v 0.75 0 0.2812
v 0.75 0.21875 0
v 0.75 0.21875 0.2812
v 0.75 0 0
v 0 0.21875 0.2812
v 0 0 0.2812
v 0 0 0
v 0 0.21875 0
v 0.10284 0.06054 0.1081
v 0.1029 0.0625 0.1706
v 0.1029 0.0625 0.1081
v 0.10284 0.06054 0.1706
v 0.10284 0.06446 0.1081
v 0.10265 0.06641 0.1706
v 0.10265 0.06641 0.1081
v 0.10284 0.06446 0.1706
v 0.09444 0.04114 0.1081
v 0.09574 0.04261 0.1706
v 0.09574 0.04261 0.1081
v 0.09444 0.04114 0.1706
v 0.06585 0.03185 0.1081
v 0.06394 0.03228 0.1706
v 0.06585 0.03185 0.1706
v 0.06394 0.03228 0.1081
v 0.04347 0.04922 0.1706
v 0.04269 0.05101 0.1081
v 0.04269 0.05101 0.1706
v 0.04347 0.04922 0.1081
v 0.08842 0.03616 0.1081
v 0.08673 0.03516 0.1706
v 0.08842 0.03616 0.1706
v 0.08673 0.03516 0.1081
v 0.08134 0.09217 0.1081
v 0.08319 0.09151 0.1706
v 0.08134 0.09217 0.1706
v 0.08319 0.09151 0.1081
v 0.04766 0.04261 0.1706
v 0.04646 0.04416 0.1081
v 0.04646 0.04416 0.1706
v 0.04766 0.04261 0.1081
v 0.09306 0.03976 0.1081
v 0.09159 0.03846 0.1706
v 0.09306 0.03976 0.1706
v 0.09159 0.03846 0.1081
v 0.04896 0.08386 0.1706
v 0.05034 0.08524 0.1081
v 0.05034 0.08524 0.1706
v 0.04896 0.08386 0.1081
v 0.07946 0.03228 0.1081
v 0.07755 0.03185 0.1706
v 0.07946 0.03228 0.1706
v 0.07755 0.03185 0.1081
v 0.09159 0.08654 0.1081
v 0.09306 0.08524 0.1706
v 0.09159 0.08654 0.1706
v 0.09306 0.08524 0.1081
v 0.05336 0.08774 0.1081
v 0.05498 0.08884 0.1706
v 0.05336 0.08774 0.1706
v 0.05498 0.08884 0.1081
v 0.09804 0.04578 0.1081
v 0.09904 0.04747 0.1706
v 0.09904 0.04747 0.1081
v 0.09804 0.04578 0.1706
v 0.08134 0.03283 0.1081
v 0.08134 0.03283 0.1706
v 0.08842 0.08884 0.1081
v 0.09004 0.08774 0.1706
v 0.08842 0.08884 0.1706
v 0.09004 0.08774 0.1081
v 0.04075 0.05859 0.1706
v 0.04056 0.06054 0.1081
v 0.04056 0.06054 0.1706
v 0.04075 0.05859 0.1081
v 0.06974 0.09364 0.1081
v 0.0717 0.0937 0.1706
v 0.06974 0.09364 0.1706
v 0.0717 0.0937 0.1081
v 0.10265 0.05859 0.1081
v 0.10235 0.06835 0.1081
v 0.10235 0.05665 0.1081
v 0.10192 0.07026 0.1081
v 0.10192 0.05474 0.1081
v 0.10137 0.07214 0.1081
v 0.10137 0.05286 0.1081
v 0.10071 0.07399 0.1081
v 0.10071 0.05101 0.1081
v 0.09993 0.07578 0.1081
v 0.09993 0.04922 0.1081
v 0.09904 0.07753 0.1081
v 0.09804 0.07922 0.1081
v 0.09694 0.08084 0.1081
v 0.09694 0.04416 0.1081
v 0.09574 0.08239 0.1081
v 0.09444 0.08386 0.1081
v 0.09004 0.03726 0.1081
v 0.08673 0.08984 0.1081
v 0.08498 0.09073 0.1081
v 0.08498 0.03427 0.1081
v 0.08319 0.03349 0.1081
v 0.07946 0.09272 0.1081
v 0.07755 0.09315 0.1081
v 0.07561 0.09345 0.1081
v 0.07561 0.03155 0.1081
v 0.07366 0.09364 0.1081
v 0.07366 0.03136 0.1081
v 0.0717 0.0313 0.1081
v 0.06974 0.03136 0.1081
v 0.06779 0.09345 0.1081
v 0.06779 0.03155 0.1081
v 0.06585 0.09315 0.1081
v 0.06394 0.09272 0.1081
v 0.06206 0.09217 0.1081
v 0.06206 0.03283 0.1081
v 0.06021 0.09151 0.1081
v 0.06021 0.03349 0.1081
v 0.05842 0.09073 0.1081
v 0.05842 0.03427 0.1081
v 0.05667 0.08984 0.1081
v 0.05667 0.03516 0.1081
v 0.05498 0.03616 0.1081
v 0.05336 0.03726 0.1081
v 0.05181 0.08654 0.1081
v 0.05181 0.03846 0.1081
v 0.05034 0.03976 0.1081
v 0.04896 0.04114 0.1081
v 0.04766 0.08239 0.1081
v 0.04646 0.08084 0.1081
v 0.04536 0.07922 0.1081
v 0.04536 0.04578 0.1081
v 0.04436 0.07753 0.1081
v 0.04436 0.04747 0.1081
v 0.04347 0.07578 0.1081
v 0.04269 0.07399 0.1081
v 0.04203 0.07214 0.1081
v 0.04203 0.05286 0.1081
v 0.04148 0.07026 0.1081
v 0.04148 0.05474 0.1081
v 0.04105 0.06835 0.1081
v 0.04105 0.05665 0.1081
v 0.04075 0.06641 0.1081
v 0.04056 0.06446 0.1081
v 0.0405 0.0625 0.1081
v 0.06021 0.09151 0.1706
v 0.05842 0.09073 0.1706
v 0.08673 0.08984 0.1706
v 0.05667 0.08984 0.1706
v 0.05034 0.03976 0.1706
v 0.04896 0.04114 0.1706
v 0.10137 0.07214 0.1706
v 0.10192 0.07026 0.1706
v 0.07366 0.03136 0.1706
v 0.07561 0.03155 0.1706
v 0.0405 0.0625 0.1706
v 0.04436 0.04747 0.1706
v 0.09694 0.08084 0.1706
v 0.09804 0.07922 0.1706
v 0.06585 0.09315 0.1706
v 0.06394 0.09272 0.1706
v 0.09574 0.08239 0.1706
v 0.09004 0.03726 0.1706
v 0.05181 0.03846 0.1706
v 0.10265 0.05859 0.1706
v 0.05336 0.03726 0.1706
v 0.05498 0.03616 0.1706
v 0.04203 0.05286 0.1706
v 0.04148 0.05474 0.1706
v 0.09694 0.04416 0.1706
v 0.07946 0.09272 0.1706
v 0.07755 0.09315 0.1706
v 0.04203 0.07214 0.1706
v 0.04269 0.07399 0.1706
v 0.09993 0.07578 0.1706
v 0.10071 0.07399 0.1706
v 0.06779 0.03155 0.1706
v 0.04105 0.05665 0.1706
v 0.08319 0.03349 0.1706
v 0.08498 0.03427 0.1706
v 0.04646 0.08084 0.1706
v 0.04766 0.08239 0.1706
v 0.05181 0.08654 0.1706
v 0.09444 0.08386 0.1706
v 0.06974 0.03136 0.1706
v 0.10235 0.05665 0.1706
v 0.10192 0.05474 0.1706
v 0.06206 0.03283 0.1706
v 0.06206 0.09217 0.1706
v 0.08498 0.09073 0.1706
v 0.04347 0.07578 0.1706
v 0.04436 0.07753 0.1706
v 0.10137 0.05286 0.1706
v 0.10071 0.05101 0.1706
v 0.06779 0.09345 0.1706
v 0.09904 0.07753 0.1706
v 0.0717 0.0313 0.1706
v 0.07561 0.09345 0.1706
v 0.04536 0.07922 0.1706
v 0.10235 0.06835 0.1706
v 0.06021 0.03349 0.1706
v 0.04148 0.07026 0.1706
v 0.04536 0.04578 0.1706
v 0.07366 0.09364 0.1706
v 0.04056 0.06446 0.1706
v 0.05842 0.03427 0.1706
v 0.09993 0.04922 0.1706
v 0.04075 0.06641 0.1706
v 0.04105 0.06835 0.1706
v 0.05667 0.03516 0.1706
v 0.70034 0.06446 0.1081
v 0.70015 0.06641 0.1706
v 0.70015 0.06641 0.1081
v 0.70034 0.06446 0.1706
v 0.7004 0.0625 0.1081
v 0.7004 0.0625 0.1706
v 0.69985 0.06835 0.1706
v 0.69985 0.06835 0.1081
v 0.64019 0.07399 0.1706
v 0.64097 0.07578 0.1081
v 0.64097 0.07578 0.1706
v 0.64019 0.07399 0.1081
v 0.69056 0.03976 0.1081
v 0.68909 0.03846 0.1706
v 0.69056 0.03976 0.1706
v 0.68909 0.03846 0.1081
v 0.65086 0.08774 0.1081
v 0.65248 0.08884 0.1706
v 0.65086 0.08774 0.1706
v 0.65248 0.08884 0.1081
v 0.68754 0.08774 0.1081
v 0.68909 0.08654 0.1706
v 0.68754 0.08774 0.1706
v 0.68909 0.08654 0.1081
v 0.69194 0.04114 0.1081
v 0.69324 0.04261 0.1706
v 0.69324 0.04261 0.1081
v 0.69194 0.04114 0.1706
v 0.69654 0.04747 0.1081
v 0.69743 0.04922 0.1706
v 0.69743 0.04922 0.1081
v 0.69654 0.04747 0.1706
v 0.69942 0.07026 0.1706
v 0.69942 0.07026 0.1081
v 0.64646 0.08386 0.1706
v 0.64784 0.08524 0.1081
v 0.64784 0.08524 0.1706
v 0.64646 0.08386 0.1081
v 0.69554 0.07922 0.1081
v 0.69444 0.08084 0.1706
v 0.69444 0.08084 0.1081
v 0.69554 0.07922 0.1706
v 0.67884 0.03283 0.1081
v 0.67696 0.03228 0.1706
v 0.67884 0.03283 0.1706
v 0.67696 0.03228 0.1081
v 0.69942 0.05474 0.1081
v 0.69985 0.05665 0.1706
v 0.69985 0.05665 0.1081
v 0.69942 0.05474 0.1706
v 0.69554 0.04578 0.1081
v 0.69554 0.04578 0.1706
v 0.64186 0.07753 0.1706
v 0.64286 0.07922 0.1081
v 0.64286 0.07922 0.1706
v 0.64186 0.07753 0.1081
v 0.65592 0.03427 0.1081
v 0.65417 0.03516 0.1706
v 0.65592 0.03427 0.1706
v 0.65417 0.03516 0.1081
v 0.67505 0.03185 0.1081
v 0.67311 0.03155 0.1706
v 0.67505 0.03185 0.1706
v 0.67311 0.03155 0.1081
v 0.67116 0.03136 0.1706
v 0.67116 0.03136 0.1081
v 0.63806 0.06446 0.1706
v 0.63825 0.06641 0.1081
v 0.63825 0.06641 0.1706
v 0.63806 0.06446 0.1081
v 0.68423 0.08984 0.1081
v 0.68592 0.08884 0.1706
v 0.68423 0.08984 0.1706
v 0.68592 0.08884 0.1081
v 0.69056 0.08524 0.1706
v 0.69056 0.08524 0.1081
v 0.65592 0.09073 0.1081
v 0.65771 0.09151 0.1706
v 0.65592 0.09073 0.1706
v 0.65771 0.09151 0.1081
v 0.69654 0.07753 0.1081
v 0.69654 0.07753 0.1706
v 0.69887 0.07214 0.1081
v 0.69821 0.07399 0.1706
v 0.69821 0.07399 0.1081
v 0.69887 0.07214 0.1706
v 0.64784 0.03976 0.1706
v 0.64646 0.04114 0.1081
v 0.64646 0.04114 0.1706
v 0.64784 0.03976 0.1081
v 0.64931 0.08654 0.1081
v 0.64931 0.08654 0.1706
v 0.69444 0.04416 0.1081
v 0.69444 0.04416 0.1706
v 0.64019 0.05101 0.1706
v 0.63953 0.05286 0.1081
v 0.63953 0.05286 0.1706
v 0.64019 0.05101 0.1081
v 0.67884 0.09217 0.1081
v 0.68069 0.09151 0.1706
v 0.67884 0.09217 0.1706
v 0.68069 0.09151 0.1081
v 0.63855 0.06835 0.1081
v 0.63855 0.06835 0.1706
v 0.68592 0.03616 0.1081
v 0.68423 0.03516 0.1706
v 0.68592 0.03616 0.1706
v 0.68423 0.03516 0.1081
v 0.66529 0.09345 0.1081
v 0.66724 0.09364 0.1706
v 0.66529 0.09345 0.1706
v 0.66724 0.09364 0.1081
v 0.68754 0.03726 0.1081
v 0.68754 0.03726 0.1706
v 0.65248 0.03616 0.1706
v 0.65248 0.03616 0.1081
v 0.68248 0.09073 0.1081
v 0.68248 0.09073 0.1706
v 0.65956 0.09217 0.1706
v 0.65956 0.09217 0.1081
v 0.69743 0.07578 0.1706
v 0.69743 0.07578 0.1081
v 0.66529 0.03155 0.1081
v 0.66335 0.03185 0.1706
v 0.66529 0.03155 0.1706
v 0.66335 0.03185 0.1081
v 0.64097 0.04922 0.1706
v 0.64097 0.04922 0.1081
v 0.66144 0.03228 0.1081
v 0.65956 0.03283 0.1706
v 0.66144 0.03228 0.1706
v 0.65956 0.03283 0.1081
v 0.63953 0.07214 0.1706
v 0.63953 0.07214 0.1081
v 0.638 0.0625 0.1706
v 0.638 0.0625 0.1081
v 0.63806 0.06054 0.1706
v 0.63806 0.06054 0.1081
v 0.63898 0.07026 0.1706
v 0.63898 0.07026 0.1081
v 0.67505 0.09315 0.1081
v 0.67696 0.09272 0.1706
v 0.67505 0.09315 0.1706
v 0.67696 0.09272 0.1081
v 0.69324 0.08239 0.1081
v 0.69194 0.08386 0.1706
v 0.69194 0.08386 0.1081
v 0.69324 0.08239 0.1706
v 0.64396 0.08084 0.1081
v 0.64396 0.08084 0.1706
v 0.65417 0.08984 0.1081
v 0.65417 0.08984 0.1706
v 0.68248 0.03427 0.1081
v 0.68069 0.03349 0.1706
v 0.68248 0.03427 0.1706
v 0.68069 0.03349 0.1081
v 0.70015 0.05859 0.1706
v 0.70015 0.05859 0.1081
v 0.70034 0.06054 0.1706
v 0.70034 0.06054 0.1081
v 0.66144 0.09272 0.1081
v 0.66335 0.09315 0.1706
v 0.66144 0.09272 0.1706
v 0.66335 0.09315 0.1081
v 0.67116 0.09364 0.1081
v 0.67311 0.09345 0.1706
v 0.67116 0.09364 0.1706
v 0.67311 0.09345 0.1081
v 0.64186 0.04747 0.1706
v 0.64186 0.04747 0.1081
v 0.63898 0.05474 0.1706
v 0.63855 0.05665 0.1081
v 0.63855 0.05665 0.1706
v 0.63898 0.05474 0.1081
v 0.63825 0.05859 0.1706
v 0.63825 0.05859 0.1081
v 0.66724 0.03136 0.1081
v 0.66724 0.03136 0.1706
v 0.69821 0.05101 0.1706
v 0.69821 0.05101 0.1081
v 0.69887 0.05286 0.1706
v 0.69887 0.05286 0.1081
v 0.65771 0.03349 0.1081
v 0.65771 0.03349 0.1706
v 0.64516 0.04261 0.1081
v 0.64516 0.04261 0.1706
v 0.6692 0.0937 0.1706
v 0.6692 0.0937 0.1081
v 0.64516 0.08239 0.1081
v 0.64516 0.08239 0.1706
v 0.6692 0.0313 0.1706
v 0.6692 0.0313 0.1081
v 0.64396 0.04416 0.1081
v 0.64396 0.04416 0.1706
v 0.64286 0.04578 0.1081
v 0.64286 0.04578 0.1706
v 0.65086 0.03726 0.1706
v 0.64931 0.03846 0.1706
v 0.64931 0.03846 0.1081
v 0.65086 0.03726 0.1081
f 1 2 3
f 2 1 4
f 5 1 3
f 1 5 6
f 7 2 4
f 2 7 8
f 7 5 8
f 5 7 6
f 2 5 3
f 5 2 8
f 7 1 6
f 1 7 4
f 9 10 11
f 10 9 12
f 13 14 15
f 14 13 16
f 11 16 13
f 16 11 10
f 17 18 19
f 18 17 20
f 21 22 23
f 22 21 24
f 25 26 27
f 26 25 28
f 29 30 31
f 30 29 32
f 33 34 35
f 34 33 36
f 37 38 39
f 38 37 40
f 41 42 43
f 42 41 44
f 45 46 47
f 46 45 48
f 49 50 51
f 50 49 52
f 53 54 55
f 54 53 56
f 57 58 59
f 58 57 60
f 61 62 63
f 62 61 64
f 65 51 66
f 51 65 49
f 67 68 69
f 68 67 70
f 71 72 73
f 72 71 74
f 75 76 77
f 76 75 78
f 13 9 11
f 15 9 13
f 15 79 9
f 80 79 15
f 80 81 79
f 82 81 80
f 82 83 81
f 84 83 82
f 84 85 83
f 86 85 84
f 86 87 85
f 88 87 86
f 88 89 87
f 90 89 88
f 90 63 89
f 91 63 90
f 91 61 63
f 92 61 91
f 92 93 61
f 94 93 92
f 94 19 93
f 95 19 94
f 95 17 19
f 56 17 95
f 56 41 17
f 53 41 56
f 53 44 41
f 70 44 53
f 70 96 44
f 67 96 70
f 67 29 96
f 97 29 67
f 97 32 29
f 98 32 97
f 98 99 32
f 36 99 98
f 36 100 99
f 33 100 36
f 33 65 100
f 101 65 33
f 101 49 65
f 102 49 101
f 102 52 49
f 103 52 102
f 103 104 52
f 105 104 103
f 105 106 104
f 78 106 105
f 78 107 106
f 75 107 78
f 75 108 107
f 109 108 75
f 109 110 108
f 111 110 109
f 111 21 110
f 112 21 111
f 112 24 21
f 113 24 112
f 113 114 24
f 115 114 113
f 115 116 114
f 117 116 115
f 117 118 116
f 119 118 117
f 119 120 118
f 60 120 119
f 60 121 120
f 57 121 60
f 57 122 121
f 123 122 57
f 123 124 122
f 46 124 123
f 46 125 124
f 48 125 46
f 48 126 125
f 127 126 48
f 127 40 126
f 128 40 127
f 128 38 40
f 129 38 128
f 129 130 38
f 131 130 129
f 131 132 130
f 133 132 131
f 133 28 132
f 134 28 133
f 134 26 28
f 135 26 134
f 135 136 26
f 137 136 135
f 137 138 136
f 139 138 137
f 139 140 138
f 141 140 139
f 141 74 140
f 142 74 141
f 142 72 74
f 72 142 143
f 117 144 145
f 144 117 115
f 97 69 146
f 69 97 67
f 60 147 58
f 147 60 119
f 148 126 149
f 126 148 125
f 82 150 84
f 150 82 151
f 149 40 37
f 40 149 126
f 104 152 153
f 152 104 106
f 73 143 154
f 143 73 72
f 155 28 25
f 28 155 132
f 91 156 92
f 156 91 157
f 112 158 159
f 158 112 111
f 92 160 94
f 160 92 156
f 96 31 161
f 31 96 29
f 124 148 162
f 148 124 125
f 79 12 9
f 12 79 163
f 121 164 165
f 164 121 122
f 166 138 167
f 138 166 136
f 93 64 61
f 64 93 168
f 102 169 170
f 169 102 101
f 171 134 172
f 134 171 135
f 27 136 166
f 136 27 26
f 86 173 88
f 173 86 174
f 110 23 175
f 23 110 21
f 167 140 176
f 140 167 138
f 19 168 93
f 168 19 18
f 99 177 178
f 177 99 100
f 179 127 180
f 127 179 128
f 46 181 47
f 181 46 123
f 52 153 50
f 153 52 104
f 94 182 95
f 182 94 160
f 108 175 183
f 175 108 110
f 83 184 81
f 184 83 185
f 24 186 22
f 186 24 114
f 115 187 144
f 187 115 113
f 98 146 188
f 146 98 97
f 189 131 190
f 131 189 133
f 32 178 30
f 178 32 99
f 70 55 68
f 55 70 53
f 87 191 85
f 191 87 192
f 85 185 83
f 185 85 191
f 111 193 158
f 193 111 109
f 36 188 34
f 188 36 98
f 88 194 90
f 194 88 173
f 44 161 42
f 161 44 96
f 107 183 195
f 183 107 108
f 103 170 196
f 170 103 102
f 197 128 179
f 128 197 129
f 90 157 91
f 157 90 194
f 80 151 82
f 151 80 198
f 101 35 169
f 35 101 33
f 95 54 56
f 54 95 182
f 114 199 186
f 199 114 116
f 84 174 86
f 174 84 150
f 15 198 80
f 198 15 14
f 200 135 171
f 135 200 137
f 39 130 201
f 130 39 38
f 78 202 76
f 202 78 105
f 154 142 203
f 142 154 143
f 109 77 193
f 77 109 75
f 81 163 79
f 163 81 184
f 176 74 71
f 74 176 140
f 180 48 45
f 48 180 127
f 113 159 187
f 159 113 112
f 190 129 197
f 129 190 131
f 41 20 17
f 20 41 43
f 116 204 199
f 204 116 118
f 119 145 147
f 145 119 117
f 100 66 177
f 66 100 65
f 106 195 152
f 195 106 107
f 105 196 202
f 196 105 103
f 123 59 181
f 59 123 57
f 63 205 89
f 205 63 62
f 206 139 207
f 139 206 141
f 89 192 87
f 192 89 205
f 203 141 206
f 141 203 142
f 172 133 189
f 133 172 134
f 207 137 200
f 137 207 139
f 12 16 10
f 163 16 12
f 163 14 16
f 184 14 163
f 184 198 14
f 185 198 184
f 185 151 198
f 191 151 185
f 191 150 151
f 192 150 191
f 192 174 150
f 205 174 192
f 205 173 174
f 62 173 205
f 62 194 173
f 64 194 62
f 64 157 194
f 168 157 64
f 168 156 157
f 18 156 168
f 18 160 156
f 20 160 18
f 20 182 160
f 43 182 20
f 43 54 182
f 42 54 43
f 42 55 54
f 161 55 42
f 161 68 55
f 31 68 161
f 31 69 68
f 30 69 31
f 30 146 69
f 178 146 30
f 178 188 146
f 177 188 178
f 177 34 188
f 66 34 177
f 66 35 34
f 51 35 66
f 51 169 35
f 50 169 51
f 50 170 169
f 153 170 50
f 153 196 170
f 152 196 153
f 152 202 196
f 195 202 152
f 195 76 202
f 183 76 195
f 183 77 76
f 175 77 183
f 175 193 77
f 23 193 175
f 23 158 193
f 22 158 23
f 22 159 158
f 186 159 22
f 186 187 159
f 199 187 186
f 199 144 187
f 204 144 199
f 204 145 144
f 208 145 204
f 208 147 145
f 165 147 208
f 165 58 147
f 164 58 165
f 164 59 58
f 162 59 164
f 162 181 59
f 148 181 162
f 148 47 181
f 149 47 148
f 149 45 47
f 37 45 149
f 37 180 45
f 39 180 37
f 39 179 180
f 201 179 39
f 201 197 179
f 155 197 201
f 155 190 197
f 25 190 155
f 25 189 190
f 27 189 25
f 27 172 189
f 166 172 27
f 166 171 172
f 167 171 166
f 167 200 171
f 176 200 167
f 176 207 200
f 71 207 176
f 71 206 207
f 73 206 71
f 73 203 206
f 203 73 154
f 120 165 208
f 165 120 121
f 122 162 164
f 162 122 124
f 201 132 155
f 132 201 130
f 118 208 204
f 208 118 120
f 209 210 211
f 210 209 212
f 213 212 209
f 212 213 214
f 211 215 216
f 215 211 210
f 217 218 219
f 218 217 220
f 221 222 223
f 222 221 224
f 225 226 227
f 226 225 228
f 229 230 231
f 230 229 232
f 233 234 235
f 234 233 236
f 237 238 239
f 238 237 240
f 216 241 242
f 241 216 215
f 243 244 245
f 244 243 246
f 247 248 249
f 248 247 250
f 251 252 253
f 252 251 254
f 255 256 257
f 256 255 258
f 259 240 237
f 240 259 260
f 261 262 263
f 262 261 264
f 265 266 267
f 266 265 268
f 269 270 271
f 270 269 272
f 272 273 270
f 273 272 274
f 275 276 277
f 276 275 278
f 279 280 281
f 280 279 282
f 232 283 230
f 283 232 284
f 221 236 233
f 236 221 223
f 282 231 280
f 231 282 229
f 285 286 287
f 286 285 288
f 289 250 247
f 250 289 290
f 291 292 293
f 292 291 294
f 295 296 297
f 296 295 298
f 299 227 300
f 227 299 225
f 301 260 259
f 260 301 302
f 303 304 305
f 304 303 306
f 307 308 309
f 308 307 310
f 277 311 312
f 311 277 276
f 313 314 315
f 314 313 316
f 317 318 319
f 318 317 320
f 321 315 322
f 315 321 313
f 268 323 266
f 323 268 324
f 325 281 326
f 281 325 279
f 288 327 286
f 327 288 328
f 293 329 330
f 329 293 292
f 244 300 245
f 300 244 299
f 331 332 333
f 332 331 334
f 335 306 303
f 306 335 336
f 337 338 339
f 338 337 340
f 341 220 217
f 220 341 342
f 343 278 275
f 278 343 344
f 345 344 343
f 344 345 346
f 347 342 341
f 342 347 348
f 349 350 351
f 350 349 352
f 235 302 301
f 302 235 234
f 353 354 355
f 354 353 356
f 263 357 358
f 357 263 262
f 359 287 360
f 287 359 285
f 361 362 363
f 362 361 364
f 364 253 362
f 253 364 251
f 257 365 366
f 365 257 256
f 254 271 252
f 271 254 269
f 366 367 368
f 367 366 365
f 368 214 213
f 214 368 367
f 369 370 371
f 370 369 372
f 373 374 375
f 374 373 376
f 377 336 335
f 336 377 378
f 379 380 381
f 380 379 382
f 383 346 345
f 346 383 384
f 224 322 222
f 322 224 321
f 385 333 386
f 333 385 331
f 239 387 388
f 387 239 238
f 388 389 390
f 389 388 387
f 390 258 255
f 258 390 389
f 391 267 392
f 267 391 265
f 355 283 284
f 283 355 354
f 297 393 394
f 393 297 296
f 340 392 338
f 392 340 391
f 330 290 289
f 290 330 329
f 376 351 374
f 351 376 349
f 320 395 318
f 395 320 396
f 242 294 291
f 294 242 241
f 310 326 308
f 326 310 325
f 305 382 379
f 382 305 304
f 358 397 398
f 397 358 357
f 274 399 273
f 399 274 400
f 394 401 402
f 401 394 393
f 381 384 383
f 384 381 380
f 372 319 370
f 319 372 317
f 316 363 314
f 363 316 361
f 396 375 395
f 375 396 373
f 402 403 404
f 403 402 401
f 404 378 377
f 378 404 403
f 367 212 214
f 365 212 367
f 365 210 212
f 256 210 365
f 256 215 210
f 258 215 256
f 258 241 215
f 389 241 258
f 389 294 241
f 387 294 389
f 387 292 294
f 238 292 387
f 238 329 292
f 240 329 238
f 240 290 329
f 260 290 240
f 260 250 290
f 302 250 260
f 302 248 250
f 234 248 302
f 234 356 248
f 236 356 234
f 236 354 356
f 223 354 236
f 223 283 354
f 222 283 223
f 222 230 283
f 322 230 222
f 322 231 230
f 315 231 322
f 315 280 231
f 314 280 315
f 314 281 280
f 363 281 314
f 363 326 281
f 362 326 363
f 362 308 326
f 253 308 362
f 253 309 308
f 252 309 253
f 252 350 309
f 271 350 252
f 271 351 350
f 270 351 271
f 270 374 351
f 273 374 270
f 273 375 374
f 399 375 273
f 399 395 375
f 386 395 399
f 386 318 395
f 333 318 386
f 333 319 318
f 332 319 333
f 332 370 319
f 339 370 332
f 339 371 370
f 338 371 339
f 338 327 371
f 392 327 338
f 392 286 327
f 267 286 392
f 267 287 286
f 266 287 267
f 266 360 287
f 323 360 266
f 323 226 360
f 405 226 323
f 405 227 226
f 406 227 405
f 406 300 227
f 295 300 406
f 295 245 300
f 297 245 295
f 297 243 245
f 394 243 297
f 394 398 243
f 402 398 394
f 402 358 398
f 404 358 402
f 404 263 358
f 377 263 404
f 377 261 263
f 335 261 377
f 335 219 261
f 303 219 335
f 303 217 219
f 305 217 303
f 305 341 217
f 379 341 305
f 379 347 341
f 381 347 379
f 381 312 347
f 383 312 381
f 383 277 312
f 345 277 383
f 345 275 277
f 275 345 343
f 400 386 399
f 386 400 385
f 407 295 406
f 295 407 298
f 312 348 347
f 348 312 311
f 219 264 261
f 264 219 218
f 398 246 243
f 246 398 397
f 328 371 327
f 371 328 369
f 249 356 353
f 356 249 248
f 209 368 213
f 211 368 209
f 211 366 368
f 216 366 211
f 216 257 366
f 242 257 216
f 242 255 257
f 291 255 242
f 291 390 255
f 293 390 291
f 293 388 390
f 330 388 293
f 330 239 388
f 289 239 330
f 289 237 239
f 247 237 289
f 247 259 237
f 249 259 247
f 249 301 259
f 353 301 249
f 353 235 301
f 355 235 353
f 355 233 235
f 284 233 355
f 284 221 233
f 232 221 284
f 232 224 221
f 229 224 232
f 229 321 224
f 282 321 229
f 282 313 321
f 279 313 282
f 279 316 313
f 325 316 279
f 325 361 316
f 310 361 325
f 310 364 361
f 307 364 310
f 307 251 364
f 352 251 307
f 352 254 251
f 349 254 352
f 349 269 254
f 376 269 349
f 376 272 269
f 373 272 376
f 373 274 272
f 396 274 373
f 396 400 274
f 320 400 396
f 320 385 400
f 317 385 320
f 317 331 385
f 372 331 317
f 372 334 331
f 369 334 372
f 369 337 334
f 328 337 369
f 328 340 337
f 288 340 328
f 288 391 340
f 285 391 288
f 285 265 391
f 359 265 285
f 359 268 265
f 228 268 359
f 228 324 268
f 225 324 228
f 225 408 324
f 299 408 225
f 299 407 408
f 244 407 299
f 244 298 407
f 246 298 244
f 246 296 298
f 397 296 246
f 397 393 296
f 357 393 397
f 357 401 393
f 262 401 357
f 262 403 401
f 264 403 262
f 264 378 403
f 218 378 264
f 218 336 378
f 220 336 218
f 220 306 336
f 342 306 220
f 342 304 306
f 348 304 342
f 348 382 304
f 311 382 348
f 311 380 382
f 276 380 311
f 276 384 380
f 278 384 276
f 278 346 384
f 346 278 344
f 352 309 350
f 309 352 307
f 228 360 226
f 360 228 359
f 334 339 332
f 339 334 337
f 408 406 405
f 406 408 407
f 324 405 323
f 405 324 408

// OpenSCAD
// === Parametric Dimensions ===
base_length = 0.75;            // x-dimension of base footprint
base_width = 0.21875;         // y-dimension of base footprint
base_height = 0.28125;        // declared z-height of base
main_extrusion_depth = 0.2812; // actual extrusion depth (z)

// Circular cutout placement (from left/front edges)
hole1_x = 0.0717;             // hole 1 center, offset from left edge
hole1_y = 0.0625;             // hole 1 center, offset from front edge
hole2_x = 0.6692;             // hole 2 center, offset from left edge
hole2_y = 0.0625;             // hole 2 center, offset from front edge
hole_radius = 0.0312;         // radius of each circular profile

// Cut band vertical range (above base underside)
cut_z_bottom = 0.1081;        // lower bound of removed band
cut_z_top = 0.1705;           // upper bound of removed band
cut_depth = 0.0625;           // vertical extent of cut

$fn = 100;                    // curve resolution

// === Base Module ===
module base_block() {
    // Solid upper-side extrusion from datum, full footprint with zero edge offsets
    // Side outline kept arched (full extrusion profile, no rectangular notch)
    cube([base_length, base_width, main_extrusion_depth]);
}

// === Circular Cutout Module ===
module circular_hole(cx, cy) {
    // Single circular profile cut from the upper side
    // Removed band runs from cut_z_bottom to cut_z_top above base underside
    translate([cx, cy, cut_z_bottom])
        cylinder(h = cut_depth, r = hole_radius);
}

// === Main Model ===
difference() {
    base_block();

    // Remove-material feature: two separate circular profiles (not a connected slot)
    // Envelope span 0.6599 x 0.0625 is bounding box only;
    // surrounding and intervening material remains solid
    circular_hole(hole1_x, hole1_y);
    circular_hole(hole2_x, hole2_y);
}
